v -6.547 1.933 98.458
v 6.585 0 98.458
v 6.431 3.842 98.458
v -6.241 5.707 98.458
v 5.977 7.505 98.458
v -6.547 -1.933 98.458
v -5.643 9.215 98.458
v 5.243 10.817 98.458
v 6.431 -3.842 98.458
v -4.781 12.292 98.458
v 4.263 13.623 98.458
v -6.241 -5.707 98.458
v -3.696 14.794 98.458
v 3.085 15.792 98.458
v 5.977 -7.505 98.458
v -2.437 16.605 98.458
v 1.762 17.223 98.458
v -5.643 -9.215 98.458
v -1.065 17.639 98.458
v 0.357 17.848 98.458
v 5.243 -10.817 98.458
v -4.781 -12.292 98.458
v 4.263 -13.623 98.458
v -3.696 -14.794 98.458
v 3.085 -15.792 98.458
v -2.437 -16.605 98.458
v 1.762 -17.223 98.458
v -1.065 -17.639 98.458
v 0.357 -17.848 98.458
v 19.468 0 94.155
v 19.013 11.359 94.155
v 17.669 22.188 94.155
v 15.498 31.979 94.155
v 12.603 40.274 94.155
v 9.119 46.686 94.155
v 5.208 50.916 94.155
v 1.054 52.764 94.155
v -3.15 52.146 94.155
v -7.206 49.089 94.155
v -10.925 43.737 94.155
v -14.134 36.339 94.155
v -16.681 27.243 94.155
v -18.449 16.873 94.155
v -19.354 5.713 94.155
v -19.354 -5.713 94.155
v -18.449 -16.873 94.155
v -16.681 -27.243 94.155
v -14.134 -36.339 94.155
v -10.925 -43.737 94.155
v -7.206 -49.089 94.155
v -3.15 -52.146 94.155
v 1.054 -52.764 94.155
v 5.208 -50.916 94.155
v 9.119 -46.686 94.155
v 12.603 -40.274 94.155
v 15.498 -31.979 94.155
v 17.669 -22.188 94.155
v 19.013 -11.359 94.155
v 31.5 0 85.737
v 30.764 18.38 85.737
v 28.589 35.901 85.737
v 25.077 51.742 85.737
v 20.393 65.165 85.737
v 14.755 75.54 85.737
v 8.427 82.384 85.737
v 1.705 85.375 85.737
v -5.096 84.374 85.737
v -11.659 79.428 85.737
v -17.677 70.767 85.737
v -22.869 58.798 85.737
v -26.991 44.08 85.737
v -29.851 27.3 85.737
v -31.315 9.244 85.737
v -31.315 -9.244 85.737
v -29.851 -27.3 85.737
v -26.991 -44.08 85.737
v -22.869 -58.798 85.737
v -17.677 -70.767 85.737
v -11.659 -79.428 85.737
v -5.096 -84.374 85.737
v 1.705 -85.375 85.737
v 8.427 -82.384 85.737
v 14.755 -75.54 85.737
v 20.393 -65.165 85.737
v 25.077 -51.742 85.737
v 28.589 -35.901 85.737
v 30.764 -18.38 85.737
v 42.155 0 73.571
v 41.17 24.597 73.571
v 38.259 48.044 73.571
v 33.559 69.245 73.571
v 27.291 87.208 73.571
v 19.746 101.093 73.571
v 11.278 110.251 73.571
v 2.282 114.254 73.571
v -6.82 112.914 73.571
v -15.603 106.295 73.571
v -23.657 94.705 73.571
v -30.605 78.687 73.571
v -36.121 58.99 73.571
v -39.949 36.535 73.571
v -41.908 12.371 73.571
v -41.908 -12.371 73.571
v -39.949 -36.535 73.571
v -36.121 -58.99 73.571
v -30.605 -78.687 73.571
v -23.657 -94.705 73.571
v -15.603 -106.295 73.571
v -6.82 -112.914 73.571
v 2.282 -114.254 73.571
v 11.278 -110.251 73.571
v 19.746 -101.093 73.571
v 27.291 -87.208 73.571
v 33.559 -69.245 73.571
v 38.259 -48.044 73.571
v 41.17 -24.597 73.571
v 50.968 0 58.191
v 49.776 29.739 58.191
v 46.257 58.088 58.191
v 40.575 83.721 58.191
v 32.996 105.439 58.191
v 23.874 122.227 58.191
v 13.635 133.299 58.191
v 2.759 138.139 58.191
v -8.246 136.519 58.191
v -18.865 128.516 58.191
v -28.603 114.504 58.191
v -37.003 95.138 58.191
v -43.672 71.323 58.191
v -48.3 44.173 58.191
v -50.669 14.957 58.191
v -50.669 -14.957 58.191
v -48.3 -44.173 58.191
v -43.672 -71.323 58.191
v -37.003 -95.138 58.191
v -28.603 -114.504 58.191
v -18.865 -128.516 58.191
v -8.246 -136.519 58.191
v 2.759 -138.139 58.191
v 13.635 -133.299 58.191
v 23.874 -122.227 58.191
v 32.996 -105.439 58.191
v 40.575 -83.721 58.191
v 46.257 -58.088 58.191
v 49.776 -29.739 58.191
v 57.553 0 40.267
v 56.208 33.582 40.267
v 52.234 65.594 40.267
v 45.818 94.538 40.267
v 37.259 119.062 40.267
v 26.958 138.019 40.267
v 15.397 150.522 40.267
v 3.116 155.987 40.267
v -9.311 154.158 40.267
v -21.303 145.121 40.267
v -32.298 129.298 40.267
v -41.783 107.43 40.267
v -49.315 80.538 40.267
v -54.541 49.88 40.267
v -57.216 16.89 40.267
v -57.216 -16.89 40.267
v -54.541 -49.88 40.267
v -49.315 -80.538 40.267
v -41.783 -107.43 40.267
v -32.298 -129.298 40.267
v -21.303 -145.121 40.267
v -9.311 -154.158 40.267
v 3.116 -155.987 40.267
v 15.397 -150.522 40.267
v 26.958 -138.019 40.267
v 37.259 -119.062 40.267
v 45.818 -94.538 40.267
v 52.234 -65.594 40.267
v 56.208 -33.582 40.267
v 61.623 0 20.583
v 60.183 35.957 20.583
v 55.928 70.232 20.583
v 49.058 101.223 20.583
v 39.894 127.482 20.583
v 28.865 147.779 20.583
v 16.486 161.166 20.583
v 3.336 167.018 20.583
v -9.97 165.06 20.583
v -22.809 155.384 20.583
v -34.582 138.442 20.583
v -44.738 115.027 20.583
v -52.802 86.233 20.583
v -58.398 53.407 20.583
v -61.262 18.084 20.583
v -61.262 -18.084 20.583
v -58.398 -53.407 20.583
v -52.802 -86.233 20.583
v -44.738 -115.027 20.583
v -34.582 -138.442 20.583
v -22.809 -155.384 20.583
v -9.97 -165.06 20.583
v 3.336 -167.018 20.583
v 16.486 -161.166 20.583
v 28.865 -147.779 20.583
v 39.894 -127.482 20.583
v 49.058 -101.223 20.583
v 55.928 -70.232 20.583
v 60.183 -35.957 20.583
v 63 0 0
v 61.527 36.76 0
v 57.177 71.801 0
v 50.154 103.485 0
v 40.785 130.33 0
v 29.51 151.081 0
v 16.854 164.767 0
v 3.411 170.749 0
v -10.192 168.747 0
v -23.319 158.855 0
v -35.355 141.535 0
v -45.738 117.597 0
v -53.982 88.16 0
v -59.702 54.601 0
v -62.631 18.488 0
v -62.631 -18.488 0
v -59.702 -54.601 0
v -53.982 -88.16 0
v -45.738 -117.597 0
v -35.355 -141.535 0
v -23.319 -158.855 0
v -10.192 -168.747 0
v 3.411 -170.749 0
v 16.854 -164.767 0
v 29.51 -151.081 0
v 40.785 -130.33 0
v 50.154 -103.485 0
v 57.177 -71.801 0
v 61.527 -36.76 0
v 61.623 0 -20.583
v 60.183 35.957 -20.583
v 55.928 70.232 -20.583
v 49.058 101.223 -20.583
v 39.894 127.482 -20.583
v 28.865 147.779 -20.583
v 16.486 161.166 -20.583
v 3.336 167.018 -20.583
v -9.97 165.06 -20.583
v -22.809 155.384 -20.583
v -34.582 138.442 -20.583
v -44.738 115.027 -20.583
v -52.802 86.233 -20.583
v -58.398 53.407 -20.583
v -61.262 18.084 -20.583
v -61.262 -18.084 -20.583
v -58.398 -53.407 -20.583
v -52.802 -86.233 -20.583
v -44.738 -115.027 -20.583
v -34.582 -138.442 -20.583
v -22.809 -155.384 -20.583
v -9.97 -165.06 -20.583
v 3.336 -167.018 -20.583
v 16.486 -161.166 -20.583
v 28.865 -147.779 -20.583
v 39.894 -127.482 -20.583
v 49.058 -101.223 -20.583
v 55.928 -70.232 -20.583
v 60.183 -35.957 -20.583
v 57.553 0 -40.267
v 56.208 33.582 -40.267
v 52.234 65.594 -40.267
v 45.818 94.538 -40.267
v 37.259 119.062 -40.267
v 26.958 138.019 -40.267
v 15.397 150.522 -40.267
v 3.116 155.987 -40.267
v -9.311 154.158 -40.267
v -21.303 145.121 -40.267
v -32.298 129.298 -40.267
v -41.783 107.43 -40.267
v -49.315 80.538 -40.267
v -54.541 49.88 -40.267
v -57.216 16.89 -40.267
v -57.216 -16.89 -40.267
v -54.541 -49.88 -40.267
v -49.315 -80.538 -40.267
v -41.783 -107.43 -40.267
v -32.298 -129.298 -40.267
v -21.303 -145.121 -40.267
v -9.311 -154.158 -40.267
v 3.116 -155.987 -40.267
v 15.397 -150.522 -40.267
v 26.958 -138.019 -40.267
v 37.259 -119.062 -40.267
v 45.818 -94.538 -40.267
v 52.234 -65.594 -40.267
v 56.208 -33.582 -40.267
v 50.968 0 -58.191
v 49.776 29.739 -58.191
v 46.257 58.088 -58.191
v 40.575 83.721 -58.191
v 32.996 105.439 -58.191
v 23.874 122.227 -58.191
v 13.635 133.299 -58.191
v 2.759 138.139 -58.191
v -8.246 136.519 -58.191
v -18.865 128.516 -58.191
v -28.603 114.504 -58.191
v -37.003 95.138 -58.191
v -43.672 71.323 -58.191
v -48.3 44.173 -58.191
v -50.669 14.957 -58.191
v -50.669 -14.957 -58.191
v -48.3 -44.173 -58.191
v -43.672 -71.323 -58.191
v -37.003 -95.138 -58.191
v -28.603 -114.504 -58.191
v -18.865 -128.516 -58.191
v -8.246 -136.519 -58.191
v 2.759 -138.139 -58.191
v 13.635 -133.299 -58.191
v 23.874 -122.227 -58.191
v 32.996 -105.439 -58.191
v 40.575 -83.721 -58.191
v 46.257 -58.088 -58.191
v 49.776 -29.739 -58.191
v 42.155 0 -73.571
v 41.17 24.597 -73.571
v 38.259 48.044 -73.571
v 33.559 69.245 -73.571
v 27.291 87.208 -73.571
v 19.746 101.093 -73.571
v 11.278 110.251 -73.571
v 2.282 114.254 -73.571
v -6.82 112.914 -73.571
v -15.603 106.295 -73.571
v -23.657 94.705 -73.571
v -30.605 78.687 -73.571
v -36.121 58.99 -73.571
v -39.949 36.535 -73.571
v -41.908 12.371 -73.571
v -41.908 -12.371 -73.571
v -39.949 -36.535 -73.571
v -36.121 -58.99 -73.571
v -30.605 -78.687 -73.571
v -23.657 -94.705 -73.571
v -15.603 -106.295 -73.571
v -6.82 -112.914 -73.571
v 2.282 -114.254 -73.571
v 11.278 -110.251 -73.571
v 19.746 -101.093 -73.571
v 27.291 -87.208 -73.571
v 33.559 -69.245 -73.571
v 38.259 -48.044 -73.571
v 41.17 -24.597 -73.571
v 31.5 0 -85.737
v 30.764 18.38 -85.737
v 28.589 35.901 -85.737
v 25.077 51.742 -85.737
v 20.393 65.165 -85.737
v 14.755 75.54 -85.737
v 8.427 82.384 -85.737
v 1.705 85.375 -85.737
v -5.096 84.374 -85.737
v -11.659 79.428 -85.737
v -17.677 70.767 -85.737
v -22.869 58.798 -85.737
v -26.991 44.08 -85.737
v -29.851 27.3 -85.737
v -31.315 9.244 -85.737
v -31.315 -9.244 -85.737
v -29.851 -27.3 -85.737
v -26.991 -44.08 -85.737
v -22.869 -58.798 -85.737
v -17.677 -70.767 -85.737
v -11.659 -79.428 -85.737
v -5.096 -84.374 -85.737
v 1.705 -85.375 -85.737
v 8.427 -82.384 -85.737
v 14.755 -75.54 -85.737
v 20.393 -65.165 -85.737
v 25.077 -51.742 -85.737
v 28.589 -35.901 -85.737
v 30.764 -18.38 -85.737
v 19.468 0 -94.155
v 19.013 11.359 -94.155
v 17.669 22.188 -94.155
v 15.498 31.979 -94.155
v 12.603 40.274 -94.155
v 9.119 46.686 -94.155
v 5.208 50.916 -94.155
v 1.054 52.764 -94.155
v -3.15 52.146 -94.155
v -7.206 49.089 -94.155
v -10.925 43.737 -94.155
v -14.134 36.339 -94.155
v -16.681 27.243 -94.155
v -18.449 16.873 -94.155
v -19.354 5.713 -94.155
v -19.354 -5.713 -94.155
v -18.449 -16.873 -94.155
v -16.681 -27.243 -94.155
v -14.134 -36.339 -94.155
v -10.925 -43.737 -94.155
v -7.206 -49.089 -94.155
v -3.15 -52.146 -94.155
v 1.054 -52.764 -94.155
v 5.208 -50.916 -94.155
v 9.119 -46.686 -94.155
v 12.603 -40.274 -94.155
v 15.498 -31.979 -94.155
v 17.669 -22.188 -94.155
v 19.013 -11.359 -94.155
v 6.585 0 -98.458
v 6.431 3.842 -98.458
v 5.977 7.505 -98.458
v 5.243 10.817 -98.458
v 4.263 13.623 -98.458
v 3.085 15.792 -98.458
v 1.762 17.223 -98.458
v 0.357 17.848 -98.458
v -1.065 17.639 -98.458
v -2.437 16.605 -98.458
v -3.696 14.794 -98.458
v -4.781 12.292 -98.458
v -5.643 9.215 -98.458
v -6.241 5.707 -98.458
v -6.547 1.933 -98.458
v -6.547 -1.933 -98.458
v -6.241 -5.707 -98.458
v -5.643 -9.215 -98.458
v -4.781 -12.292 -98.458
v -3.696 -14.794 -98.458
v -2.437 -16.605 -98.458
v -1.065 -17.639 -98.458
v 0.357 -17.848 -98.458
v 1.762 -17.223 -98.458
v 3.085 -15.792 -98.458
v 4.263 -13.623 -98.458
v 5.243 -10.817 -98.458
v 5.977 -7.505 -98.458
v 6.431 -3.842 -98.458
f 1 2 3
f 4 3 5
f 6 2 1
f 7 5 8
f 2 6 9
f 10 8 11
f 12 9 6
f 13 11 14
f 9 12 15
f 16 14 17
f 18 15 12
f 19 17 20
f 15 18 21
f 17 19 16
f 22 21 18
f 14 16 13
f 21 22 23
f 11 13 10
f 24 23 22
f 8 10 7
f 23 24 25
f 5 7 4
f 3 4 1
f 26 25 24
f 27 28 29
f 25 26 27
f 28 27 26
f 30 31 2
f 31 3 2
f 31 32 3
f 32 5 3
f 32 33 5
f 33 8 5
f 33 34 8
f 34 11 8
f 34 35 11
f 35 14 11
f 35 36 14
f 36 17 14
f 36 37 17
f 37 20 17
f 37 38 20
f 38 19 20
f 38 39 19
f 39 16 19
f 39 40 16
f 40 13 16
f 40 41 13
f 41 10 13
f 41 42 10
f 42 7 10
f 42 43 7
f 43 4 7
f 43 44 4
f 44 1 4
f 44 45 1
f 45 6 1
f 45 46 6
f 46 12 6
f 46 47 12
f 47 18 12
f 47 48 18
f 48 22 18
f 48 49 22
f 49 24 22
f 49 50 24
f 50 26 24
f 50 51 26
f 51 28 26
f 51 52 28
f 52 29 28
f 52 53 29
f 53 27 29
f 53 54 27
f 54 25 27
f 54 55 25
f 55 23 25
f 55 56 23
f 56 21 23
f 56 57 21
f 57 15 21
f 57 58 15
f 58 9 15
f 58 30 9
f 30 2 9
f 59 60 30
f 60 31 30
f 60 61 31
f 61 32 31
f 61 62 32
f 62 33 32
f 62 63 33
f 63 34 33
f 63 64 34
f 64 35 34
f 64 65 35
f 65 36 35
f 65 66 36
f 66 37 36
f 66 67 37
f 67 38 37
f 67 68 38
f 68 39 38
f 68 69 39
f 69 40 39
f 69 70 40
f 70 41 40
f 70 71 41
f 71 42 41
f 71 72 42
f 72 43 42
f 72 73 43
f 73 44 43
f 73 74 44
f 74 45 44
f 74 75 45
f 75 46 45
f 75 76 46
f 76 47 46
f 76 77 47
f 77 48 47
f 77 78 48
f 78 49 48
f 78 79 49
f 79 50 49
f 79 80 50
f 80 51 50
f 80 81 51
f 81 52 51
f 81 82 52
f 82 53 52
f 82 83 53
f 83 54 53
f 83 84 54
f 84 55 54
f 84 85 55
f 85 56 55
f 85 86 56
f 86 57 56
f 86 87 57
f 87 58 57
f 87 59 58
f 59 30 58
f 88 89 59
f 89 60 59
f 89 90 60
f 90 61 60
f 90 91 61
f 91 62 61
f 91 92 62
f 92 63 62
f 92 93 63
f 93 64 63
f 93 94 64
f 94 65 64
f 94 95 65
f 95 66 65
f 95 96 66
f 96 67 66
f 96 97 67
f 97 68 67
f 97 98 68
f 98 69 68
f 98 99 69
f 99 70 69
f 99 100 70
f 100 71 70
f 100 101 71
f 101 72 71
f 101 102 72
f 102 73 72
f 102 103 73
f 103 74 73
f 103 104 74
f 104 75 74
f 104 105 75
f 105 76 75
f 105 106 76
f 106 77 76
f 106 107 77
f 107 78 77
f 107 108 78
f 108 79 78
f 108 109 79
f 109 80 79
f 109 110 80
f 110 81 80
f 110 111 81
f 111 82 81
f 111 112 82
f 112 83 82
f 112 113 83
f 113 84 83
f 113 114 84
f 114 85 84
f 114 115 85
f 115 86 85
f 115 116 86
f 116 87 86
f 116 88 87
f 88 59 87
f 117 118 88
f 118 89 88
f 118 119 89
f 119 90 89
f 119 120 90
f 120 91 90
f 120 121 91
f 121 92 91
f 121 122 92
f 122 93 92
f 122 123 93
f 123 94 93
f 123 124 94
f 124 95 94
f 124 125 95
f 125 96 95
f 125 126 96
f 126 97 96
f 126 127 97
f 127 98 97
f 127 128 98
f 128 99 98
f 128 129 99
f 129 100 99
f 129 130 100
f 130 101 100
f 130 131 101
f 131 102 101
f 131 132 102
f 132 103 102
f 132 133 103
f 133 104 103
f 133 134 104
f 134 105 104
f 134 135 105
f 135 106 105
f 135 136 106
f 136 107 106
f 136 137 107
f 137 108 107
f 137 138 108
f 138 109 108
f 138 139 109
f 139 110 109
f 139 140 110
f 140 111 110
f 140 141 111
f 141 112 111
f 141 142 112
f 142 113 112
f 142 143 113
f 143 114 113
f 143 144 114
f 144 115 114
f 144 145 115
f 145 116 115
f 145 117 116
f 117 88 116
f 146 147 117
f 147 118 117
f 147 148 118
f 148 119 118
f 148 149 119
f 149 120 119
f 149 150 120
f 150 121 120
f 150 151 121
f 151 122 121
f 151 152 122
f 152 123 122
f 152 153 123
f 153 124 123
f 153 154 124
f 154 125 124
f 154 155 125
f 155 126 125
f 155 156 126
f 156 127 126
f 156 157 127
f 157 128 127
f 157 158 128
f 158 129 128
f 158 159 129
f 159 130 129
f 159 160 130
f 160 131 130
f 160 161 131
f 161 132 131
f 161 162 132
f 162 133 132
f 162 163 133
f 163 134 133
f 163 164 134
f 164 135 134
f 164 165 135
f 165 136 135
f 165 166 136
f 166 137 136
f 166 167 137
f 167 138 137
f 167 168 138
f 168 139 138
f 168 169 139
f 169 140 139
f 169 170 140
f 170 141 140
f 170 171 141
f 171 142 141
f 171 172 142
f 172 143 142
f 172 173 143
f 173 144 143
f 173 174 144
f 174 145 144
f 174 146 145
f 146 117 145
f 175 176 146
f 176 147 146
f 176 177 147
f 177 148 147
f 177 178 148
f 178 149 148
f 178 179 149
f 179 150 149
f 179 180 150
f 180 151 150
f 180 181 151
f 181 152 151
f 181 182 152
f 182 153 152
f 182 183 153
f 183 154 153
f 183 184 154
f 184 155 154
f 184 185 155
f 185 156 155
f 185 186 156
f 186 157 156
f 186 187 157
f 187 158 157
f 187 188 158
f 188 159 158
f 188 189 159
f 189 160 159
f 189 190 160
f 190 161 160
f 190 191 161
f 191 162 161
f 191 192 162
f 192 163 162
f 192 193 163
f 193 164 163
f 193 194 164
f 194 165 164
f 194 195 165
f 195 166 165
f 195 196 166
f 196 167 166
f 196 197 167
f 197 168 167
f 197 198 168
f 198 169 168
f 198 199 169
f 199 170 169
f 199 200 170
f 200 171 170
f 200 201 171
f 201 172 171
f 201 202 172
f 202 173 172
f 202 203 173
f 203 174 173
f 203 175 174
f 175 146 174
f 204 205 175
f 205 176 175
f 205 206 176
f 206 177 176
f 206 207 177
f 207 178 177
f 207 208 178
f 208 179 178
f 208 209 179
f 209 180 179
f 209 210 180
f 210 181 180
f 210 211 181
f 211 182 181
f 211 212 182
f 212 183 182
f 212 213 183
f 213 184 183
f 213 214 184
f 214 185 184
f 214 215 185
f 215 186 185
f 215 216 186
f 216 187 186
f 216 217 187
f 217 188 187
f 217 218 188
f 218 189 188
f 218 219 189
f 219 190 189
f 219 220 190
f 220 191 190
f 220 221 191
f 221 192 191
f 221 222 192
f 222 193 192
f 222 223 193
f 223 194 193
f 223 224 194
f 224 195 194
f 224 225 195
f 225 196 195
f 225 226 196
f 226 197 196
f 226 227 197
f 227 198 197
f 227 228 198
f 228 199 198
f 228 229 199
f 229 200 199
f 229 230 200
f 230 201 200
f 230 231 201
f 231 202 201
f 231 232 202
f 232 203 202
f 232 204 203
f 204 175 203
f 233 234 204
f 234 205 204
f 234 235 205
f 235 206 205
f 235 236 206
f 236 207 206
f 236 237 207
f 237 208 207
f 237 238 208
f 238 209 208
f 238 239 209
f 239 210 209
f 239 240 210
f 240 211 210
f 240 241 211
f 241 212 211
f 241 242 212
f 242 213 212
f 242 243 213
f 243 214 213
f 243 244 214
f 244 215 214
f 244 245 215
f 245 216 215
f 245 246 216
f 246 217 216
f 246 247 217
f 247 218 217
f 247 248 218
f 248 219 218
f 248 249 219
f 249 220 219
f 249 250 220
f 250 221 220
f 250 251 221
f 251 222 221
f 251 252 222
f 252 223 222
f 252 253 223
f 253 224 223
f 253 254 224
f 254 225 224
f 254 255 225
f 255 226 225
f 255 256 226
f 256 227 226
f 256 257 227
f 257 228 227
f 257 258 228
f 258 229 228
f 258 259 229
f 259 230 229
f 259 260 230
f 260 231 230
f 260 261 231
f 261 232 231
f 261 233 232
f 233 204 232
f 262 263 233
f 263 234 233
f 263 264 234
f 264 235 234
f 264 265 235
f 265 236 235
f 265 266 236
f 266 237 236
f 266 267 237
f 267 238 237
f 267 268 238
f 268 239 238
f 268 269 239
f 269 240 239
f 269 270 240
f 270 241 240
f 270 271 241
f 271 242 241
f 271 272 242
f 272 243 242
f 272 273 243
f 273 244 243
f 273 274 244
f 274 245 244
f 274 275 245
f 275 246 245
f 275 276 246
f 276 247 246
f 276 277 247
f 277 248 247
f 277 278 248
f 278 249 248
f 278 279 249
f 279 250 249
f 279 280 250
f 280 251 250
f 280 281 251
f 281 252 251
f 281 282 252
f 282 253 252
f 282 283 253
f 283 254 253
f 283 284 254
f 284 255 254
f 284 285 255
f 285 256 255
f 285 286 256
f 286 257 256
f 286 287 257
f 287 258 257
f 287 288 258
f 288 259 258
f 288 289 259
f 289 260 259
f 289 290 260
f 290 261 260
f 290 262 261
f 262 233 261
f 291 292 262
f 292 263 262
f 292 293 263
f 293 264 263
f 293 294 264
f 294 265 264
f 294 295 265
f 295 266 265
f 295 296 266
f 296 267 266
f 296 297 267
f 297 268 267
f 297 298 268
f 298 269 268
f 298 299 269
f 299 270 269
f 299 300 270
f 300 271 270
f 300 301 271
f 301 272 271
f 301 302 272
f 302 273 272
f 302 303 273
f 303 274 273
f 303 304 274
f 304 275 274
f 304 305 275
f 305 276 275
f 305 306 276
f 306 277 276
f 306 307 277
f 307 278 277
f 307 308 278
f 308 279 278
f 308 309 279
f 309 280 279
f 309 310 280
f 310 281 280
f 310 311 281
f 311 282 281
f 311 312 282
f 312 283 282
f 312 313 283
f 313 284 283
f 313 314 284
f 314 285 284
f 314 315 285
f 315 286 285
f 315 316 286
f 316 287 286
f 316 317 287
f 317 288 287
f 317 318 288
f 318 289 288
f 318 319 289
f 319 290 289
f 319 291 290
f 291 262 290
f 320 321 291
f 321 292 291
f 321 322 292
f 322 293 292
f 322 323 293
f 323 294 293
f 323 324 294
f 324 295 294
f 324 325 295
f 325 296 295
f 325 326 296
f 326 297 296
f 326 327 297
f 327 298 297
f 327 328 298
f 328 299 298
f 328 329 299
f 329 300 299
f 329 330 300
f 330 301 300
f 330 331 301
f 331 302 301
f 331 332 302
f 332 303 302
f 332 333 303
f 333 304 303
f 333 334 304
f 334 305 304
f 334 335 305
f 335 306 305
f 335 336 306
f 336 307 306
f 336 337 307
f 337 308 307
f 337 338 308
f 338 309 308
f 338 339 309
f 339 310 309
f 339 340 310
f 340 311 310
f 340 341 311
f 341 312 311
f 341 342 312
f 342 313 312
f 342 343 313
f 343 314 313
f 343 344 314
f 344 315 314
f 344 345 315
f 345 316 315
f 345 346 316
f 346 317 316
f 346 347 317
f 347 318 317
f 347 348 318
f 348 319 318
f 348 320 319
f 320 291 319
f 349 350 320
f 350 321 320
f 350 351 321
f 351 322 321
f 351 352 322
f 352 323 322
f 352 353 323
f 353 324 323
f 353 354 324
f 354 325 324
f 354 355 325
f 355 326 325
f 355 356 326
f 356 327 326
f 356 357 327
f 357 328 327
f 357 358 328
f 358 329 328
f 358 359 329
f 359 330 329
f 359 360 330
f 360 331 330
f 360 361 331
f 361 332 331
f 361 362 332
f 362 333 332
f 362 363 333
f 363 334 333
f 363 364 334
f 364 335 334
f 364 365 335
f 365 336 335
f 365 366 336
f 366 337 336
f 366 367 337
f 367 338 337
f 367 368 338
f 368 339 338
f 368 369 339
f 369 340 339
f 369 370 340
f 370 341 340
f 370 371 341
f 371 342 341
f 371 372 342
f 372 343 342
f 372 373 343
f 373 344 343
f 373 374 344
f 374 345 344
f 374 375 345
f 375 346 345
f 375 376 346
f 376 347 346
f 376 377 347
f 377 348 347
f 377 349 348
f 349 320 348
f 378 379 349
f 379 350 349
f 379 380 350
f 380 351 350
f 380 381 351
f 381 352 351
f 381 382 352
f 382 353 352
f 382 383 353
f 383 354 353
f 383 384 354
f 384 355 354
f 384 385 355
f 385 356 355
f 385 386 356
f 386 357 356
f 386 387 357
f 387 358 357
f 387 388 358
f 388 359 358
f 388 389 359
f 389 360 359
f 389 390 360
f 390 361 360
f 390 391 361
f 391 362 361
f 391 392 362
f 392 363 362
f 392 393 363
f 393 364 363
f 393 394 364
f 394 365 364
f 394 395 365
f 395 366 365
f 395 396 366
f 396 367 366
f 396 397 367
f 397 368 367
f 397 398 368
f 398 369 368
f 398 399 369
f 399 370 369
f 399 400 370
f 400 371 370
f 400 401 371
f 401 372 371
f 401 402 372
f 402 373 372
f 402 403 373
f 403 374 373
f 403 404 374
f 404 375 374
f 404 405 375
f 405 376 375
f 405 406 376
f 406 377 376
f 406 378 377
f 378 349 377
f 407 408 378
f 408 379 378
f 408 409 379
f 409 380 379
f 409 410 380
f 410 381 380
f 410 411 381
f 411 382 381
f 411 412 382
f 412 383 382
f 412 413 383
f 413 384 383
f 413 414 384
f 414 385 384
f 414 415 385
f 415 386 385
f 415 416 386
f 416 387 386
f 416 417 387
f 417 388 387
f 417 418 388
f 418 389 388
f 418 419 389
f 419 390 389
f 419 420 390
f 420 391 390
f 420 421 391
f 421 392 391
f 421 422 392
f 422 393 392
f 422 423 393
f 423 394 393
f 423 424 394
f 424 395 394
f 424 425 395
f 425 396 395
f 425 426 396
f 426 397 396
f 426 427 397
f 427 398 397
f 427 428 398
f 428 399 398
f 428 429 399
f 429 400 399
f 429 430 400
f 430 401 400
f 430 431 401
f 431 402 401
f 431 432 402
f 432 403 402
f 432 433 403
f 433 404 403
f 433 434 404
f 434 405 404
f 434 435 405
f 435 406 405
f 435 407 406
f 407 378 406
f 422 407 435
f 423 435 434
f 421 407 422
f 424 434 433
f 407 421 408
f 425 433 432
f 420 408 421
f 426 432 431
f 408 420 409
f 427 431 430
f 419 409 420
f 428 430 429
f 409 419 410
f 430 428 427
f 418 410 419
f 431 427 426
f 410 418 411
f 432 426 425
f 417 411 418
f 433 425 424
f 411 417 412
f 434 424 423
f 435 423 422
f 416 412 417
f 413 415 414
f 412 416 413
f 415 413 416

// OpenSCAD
// Generated by SolidPython 1.0.1 on 2020-07-29 00:46:48


scale(v = [7, 19, 11]) {
	sphere(r = 9);
}
/***********************************************
*********      SolidPython code:      **********
************************************************
 
# import packages: SolidPython
from solid import *
from solid.utils import *
from itertools import chain, combinations, permutations


class Resize:

    def __init__(self, scad_file):
        self.scad_file = scad_file
        #self.scad_file = import_scad(scad_file)
        # cone/cylinder param:
        self.r1 = 0
        self.r2 = 0
        self.h = 0
        # rectangular prism param:
        self.w = 0
        self.l = 0
        # ellipse param:
        self.r = 0

    # import OpenScad code (file name corresponds to shape)


    # classify shape + parameters
    def assign(self, param1, param2, param3):
        if self.scad_file == 'cone.scad':
            self.r1 = param1
            self.r2 = param2
            self.h = param3
        elif self.scad_file == 'cylinder.scad':
            self.r1 = param1
            self.r2 = param2
            self.h = param3
        elif self.scad_file == 'rectangularPrism.scad':
            self.h = param1
            self.l = param2
            self.w = param3
        else:
            self.r = param1
            self.h = param2

    # resize parameters
    def iterate(self):
        x = range(3, 20, 2)
        i = 1
        if self.scad_file == 'cone.scad':
            tempList = list(permutations(x, 2))
            for temp in tempList:
                param1 = temp[0]
                param2 = temp[1]
                filepath = 'produced_scad_files/' + 'cone' + str(param1) + '_' + str(param2) + '_' + '.scad'
                scad_render_to_file(cylinder(h=param1, r1=param2, r2=0), filepath)

        elif self.scad_file == 'cylinder.scad':
            tempList = list(permutations(x, 3))
            for temp in tempList:
                param1 = temp[0]
                param2 = temp[1]
                filepath = 'produced_scad_files/' + 'cylinder' + str(param1) + '_' + str(param2) + '_' + '.scad'
                scad_render_to_file(cylinder(h=param1, r1=param2, r2=param2), filepath)

        elif self.scad_file == 'rectangularPrism.scad':
            tempList = list(permutations(x, 3))
            for temp in tempList:
                param1 = temp[0]
                param2 = temp[1]
                param3 = temp[2]
                filepath = 'produced_scad_files/' + 'rectangularPrism' + str(param1) + '_' + str(param2) + '_' + str(
                    param3) + '.scad'
                scad_render_to_file(cube(size=(param1, param2, param3)), filepath)

        elif self.scad_file == 'ellipse.scad':
            tempList = list(permutations(x, 4))
            for temp in tempList:
                param1 = temp[0]
                param2 = temp[1]
                param3 = temp[2]
                param4 = temp[3]
                filepath = 'produced_scad_files/' + 'ellipse' + str(param1) + '_' + str(param2) + '_' + str(param3) + '_' + str(param4) + '.scad'
                scad_render_to_file(scale([param1, param2, param3])(sphere(r=param4)), filepath)

    def render_to_scadfile(self):
        scad_render_to_file(scad, 'example.scad') 
 
************************************************/
